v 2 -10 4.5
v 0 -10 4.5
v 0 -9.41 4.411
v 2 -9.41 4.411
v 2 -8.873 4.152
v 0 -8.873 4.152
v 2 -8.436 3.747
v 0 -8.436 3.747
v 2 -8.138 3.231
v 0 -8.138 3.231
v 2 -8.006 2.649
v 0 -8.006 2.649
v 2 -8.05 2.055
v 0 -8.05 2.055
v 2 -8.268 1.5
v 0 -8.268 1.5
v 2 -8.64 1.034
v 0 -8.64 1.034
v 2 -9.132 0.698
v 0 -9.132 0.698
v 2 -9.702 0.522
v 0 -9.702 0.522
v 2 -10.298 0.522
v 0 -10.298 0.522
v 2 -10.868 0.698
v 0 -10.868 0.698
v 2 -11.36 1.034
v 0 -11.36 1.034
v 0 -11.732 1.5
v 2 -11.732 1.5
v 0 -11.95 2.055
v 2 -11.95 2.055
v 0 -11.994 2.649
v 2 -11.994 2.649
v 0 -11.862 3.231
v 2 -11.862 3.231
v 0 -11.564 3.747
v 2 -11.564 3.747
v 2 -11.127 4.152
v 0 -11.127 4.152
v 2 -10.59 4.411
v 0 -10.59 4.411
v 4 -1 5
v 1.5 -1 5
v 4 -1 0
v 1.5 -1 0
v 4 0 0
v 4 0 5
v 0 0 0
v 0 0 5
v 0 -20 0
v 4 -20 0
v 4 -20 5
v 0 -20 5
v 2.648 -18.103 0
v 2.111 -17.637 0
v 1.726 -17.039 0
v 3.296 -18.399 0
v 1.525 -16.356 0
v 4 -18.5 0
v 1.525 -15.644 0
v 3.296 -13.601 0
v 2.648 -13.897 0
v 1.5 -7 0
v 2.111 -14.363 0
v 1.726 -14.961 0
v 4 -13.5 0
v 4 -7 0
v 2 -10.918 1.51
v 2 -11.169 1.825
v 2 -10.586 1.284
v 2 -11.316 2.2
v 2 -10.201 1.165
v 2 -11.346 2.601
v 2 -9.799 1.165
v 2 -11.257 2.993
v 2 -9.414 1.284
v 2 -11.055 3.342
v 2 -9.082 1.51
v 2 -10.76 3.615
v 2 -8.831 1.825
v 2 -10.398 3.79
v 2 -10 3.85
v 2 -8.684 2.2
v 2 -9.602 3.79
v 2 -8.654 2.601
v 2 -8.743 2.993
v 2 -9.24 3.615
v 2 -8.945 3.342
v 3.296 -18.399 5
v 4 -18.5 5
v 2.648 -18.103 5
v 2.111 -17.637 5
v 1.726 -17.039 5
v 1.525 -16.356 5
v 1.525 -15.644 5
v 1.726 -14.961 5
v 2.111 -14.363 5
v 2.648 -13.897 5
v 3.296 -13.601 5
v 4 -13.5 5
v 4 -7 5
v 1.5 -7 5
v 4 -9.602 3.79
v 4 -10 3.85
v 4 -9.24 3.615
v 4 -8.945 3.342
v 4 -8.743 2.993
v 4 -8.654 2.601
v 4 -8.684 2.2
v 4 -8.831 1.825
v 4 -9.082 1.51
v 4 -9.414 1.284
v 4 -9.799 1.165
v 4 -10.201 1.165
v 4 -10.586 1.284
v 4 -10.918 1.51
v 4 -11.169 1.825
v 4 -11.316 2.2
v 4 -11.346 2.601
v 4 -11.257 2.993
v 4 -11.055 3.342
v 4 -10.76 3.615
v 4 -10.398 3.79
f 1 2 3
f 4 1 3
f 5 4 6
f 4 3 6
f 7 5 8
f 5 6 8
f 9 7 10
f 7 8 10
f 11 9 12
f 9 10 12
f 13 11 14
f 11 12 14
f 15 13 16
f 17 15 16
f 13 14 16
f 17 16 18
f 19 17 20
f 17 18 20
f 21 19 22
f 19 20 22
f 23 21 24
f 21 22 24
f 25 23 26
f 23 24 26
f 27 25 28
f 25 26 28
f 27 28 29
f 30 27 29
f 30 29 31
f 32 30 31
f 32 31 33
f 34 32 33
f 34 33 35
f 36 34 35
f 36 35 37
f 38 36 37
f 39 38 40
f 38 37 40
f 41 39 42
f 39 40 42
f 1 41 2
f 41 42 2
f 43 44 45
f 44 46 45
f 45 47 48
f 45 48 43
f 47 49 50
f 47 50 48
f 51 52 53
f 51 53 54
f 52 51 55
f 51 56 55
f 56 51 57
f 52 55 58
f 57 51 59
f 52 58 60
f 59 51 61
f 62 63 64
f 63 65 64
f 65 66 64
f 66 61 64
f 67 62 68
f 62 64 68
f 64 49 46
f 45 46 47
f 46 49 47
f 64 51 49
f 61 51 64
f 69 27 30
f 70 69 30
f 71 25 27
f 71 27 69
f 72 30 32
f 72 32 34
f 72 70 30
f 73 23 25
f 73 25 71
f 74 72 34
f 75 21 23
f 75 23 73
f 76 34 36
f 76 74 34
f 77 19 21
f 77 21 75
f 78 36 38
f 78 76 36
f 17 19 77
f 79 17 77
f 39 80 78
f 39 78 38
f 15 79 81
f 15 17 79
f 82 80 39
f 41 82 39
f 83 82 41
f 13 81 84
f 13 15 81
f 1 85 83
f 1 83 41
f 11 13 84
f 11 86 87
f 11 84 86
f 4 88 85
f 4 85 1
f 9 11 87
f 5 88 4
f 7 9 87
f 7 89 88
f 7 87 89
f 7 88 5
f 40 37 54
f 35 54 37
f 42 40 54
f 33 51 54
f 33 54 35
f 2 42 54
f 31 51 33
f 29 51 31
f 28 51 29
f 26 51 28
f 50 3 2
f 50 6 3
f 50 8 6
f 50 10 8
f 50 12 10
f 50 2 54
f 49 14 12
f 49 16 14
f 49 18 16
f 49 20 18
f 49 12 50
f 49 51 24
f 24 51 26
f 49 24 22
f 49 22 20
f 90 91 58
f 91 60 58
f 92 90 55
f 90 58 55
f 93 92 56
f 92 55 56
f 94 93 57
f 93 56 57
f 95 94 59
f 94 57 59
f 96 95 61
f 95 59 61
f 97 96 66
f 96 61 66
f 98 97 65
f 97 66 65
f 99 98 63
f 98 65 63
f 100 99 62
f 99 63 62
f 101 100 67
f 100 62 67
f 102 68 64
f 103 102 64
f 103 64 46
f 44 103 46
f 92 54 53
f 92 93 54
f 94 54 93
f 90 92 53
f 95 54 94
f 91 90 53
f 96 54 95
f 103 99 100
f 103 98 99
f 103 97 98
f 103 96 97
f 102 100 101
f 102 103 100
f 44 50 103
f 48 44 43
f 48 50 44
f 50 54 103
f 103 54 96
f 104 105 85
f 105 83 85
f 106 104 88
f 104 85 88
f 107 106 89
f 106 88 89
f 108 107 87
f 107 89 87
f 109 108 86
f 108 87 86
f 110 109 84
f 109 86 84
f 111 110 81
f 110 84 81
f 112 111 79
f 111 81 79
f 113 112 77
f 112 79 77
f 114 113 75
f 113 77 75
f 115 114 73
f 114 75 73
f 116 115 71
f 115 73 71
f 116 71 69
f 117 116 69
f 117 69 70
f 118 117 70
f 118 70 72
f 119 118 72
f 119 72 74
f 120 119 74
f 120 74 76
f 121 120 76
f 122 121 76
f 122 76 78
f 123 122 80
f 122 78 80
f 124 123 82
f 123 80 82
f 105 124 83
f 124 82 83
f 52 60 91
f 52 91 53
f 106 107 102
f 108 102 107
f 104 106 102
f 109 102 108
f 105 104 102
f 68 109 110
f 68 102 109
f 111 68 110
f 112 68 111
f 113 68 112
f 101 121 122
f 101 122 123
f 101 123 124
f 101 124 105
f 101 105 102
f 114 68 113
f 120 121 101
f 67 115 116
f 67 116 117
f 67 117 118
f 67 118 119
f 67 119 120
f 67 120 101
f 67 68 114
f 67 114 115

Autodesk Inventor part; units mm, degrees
ref_plane "YZ Plane" through (0, 0, 0) normal (1, 0, 0) x (0, 1, 0)
ref_plane "XZ Plane" through (0, 0, 0) normal (0, 1, 0) x (-1, 0, 0)
ref_plane "XY Plane" through (0, 0, 0) normal (0, 0, 1) x (1, 0, 0)
sketch "Sketch1" plane through (0, 0, 0) normal (0, 0, 1) x (1, 0, 0)
  line L0 (0, 0) -> (4, 0)
  line L1 (4, 0) -> (4, -20)
  line L2 (4, -20) -> (0, -20)
  line L3 (0, -20) -> (0, 0)
  circle A0 centre (4, -4) radius 2.5
  circle A1 centre (4, -16) radius 2.5
  line L4 (1.5, -4) -> (1.5, -7)
  line L5 (1.5, -7) -> (1.5, -1)
  line L6 (4, -7) -> (1.5, -7)
  line L7 (1.5, -1) -> (4, -1)
  point P0 (4, -18.5)
  point P1 (4, -13.5)
  dimension "d2" = 5
  dimension "d0" = 20
  dimension "d1" = 4
  dimension "d3" = 5
  dimension "d4" = 4
  dimension "d5" = 4
  dimension "d6" = 3
  dimension "d7" = 3
extrude "Extrusion1" add sketch "Sketch1" along normal blind 5 contours L0 L1 L7 L5 L4 L6 A1 L2 L3
sketch "Sketch3" plane through (0, -20, 0) normal (-1, 0, 0) x (0, 0, 1)
  circle A0 centre (2.5, 10) radius 1.35
  line L0 (0, 0) -> (5, 0) projected
  line L1 (0, 20) -> (0, 0) projected
  dimension "d10" = 10
  dimension "d11" = 2.5
  dimension "d12" = 20
  dimension "d13" = 2.7
extrude "Extrusion2" cut sketch "Sketch3" against normal blind 20
sketch "Sketch4" plane through (0, -20, 0) normal (-1, 0, 0) x (0, 0, 1)
  circle A0 centre (2.5, 10) radius 1.35 projected
  circle A1 centre (2.5, 10) radius 2
  point P0 (0, 20)
  dimension "d16" = 4
extrude "Extrusion3" cut sketch "Sketch4" against normal blind 2 contours A0 | A1
equation "\"d1\" = d4"
equation "\"d5\" = d4"
properties part number "POMSliderAxis"
